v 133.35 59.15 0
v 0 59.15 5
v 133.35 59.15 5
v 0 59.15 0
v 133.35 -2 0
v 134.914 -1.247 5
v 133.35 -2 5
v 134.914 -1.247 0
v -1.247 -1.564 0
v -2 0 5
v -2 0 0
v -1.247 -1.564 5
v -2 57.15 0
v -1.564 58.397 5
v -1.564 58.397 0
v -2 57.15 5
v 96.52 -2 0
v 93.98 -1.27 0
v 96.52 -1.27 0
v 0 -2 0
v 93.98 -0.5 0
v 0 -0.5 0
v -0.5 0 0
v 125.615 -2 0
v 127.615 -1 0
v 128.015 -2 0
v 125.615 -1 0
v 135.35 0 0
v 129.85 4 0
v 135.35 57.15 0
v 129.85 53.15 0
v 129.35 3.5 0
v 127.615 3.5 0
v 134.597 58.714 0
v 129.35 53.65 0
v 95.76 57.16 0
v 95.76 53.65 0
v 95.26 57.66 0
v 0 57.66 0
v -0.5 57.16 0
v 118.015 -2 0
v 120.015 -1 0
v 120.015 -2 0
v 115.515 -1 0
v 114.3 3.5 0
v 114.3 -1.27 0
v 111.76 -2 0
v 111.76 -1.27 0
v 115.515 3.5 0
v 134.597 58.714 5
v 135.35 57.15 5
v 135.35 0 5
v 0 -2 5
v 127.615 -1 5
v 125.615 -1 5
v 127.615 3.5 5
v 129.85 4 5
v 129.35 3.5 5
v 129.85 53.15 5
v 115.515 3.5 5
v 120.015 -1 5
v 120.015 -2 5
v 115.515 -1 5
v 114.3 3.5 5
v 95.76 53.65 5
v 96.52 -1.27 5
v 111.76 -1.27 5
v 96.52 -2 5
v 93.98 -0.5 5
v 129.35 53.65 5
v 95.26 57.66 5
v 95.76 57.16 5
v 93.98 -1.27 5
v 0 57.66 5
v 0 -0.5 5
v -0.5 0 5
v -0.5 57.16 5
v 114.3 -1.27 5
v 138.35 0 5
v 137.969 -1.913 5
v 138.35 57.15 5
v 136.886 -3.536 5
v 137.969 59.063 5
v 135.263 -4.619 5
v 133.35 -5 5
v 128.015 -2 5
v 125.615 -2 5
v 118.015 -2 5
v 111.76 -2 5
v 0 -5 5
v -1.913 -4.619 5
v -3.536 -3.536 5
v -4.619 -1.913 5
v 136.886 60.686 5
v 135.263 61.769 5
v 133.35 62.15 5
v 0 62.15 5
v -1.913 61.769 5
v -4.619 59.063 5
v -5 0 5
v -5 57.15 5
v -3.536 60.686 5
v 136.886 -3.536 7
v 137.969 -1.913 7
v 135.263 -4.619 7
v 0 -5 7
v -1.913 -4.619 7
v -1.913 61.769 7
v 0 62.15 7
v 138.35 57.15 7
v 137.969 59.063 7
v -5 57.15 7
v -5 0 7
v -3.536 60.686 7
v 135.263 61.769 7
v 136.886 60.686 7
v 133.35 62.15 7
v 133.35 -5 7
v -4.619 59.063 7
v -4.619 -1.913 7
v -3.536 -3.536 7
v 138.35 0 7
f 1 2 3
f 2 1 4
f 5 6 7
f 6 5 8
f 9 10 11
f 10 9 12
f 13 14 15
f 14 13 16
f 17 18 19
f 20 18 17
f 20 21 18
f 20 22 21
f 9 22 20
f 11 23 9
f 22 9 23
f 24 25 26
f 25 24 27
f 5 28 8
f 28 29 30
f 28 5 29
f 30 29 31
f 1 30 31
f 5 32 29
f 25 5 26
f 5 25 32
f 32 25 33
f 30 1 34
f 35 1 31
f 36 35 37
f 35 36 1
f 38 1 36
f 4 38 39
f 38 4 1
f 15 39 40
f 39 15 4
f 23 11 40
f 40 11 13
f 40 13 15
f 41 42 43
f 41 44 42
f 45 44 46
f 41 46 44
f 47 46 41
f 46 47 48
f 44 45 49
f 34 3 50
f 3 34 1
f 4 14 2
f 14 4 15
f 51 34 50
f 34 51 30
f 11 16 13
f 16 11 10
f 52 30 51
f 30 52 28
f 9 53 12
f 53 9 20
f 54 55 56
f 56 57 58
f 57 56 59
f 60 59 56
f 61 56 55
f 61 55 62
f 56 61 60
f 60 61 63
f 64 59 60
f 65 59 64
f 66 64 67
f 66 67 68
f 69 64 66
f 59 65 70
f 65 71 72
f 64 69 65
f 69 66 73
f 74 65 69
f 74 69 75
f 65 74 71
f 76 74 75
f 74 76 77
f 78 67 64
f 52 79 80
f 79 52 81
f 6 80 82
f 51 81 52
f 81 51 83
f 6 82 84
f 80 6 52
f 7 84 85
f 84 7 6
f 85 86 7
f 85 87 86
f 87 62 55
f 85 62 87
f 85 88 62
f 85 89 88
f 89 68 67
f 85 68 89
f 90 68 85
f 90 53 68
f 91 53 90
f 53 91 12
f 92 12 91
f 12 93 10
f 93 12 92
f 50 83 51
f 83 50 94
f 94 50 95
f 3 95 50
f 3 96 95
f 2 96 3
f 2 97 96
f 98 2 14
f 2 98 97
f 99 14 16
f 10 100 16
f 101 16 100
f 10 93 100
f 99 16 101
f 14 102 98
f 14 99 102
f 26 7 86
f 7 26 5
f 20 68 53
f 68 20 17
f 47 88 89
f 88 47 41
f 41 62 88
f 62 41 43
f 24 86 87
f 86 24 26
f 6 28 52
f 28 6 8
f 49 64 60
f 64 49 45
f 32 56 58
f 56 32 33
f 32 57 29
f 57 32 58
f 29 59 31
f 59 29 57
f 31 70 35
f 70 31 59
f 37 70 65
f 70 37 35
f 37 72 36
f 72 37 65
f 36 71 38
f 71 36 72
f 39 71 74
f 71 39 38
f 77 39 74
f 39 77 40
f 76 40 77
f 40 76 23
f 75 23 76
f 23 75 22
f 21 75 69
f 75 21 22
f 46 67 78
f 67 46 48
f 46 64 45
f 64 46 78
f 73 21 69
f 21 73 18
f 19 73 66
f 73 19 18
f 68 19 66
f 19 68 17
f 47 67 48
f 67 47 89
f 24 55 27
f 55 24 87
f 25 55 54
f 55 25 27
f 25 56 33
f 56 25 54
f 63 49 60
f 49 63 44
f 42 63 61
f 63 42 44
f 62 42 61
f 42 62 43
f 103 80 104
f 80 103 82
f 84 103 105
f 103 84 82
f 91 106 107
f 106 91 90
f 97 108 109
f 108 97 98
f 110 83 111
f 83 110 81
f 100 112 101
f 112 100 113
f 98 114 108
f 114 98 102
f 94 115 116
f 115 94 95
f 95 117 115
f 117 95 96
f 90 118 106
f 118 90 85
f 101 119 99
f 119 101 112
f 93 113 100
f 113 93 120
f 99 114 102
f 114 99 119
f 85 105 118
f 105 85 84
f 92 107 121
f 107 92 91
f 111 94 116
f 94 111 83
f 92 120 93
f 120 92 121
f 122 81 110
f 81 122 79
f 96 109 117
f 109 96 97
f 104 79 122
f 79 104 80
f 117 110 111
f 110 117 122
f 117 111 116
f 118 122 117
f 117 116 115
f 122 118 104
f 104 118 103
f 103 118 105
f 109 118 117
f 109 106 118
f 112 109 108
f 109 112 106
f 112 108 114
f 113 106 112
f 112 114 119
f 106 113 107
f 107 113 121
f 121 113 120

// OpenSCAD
// file: ../../../lib/circuits/helpers.scad
function bu(u) = u * 2.54;

module breadboard_row(number, orientation="vertical") {
  children();
  if(number > 1) {
    if(orientation == "vertical") {
      translate([0,bu(1),0])
        breadboard_row(number-1, orientation=orientation) {
          children();
        }
    } else {
      translate([bu(1),0,0])
        breadboard_row(number-1, orientation=orientation){
          children();
        }
    }
  }
}
// file: ../../../lib/switches/rgb.scad
include <../variables.scad>

module rgb_row_trace_connection(width, height, xpos, ypos, rgb, connections) {
  half_width = u_mm(width)/2;
  half_height = u_mm(height)/2;
  if(connections[3] == "connect") {
    translate([1-half_width,8.875,0]){
      circle(d=0.8,$fn=40);
      offset(0.4)
        polygon(points=[[0,-0.01],[0,0.01],[u_mm(-xpos)-2, u_mm(-ypos)+0.01],[u_mm(-xpos)-2, u_mm(-ypos)-0.01]]);
    }
    translate([1-half_width,4.9,0]){
      circle(d=0.8,$fn=40);
      offset(0.4)
        polygon(points=[[0,-0.01],[0,0.01],[u_mm(-xpos)-2, u_mm(-ypos)+0.01],[u_mm(-xpos)-2, u_mm(-ypos)-0.01]]);
    }
    translate([1-half_width,3.3,0]){
      circle(d=0.8,$fn=40);
      offset(0.4)
        polygon(points=[[0,-0.01],[0,0.01],[u_mm(-xpos)-2, u_mm(-ypos)+0.01],[u_mm(-xpos)-2, u_mm(-ypos)-0.01]]);
    }
  }
  if(connections[2] == "connect") {
    translate([half_width-1,8.875,0]) {
      circle(d=0.8,$fn=40);
    }
    translate([half_width-1,4.9,0]) {
      circle(d=0.8,$fn=40);
    }
    translate([half_width-1,3.3,0]){
      circle(d=0.8,$fn=40);
    }
  }
}

module rgb_pcb_drill(width=1, height=1, rgb=true, connections=["hole","hole","hole","hole"]) {
  half_width = u_mm(width)/2;
  half_height = u_mm(height)/2;
  translate([half_width,half_height,0]) {
    if(rgb == true) {
      // LED Hole
      translate([-1.875,3.4])
        square([3.75,3]);

      // LED D
      if(connections[3] == "hole")
        translate([1.3-half_width,8,0])
          circle(d=1,$fn=40);
      if(connections[2] == "hole")
        translate([half_width-1.3,8,0])
          circle(d=1,$fn=40);

      // LED G
      if(connections[3] == "hole")
        translate([1.3-half_width,5.4,0])
          circle(d=1,$fn=40);
      if(connections[2] == "hole")
        translate([half_width-1.3,5.4,0])
          circle(d=1,$fn=40);

      // LED V
      if(connections[3] == "hole")
        translate([1.3-half_width,2.8,0])
          circle(d=1,$fn=40);
      if(connections[2] == "hole")
        translate([half_width-1.3,2.8,0])
          circle(d=1,$fn=40);
    }

    children();
  }
}

module rgb_pcb_hole_traces(width=1, height=1, rgb=true, xpos=0, ypos=0, connections=["hole","hole","hole","hole"]) {
  half_width = u_mm(width)/2;
  half_height = u_mm(height)/2;
  translate([half_width,half_height,0]) {
    if(rgb == true) {
      // LED D
      if(connections[3] == "hole")
        translate([1.3-half_width,8,0])
          circle(d=2.5,$fn=40);
      if(connections[2] == "hole")
        translate([half_width-1.3,8,0])
          circle(d=2.5,$fn=40);

      // LED G
      if(connections[3] == "hole")
        translate([1.3-half_width,5.4,0])
          circle(d=2.5,$fn=40);
      if(connections[2] == "hole")
        translate([half_width-1.3,5.4,0])
          circle(d=2.5,$fn=40);

      // LED V
      if(connections[3] == "hole")
        translate([1.3-half_width,2.8,0])
          circle(d=2.5,$fn=40);
      if(connections[2] == "hole")
        translate([half_width-1.3,2.8,0])
          circle(d=2.5,$fn=40);
    }

    children();
  }
}

module rgb_pcb_traces(width=1, height=1, rgb=true, xpos=0, ypos=0, connections=["hole","hole","hole","hole"]) {
  half_width = u_mm(width)/2;
  half_height = u_mm(height)/2;
  rgb_pcb_hole_traces(width=width, height=height, rgb=rgb, connections=connections) {
    if(rgb == true) {
      rgb_row_trace_connection(width=width, height=height, xpos=xpos, ypos=ypos, rgb=rgb, connections=connections);
      v_left = connections[3] == "none" ? 1 : half_width-5;
      // LED G
      translate([1.25,5])
        square([2,2]);
      translate([2.7,8.5,0]) {
        length = connections[2] == "none" ? 2 : half_width-3.7; 
        square([length,0.75]);
      }
      translate([2.7,6.8])
        square([0.8,2.4]);
      translate([-3.5,6.2])
        square([7,0.8]);
      translate([-3.5,6.8])
        square([0.8,2.4]);
      translate([-4-v_left,8.5,0])
        square([v_left+1,0.75]);

      // LED D
      translate([-4-v_left,4.5,0])
        square([v_left,0.8]);
      translate([-4.5,4.5,0])
        square([0.8,1.3]);
      translate([-4.5,5,0])
        square([1.3,0.8]);
      translate([2,4,0])
        square([2,0.8]);
      translate([4,4,0])
        square([0.8,1.3]);
      translate([4,4.5,0]) {
        length = connections[2] == "none" ? 0 : half_width-5; 
        square([length,0.75]);
      }
      translate([-3.375,5])
        square([2,1.1]);
      translate([1.25,3.75])
        square([2,1.1]);

      // LED V
      v_right = connections[2] == "none" ? 0 : half_width-5.25;
      translate([-4-v_left,2.9,0])
        square([v_right+v_left+8.875,0.8]);
      translate([-3.375,3.5])
        square([2,1.35]);
    }

    children();
  }
}
// file: ../../../lib/switches/base.scad
include <../variables.scad>
include <rgb.scad>

// ["top", "bottom", "left", "right"]

module switch_row_trace_connection(width, height, xpos, ypos, rgb, connections) {
  half_width = u_mm(width)/2;
  half_height = u_mm(height)/2;
  if(connections[3] == "connect") {
    translate([1-half_width,-5.5,0]){
      circle(d=0.8,$fn=40);
      offset(0.4)
        polygon(points=[[0,-0.01],[0,0.01],[u_mm(-xpos)-2, u_mm(-ypos)+0.01],[u_mm(-xpos)-2, u_mm(-ypos)-0.01]]);
    }
  }
  if(connections[2] == "connect") {
    translate([half_width-1,-5.5,0]) {
      circle(d=0.8,$fn=40);
    }
  }
}

module switch_column_trace_connection(width, height, xpos, ypos, rgb, connections, last_xpos=0, last_ypos=0) {
  half_width = u_mm(width)/2;
  half_height = u_mm(height)/2;
  if(connections[1] == "connect") {
    translate([-u_mm((width-1)/2)-0.9,half_height-1,0]) {
      circle(d=0.8,$fn=40);
      offset(0.4)
        polygon(points=[[0,-0.01],[0,0.01],[u_mm((width-1)/2),0.01],[u_mm((width-1)/2),-0.01]]);
    }
  }
  if(connections[0] == "connect") {
    y_off = u_mm(ypos-last_ypos);
    x_off = u_mm(last_xpos-xpos);
    translate([-0.875,-1-y_off-half_height,0]) {
      offset(0.4)
        polygon(points=[[-0.01+x_off,0],[0.01+x_off,0],[0.01,2+y_off],[-0.01,2+y_off]]);
      translate([x_off-0.01,0]) {
        offset(0.4)
          polygon(points=[[0,-0.01],[0,0.01],[u_mm((width-1)/2)+1,0.01],[u_mm((width-1)/2)+1,-0.01]]);
      }
    }
  }
}

module switch_base_pcb_drill(width=1, height=1, rgb=true, single=true, connections=["hole","hole","hole","hole"]) {
  half_width = u_mm(width)/2;
  half_height = u_mm(height)/2;
  rgb_pcb_drill(width=width, height=height, rgb=rgb, connections=connections) {
    // Row
    if(connections[2] == "hole")
      translate([half_width-1.3,-5.5,0])
        circle(d=1,$fn=40);
    if(connections[3] == "hole")
      translate([1.3-half_width,-5.5,0])
        circle(d=1,$fn=40);

    // Column
    if(connections[1] == "hole")
      translate([-1,half_height-1.25,0])
        circle(d=1,$fn=40);
    if(connections[0] == "hole")
      translate([-1,1.25-half_height,0])
        circle(d=1,$fn=40);

    children();
  }
}

module switch_base_pcb_traces(width=1, height=1, rgb=true, xpos=0, ypos=0, connections=["hole","hole","hole","hole"], last_xpos=0, last_ypos=0, single=true) {
  half_width = u_mm(width)/2;
  half_height = u_mm(height)/2;
  rgb_pcb_traces(width=width, height=height, rgb=rgb, xpos=xpos, ypos=ypos, connections=connections) {
    switch_row_trace_connection(width, height, xpos, ypos, rgb, connections);
    if(single && !rgb)
      switch_column_trace_connection(width, height, xpos, ypos, rgb, connections, last_xpos=last_xpos, last_ypos=last_ypos);

    // Row
    if(connections[2] == "hole")
      translate([half_width-1.3,-5.5,0])
        circle(d=2.5,$fn=40);
    if(connections[3] == "hole")
      translate([1.3-half_width,-5.5,0])
        circle(d=2.5,$fn=40);

    // Column
    if(connections[1] == "hole")
      translate([-1,half_height-1.25,0])
        circle(d=2.4,$fn=40);
    if(connections[0] == "hole")
      translate([-1,1.25-half_height,0])
        circle(d=2.4,$fn=40);

    children();
  }
}

module switch_base_pcb_traces_bottom(width=1, height=1, rgb=true, xpos=0, ypos=0, connections=["hole","hole","hole","hole"], last_xpos=0, last_ypos=0) {
  half_width = u_mm(width)/2;
  half_height = u_mm(height)/2;
  rgb_pcb_hole_traces(width=width, height=height, rgb=rgb, connections=connections) {
    switch_column_trace_connection(width, height, xpos, ypos, rgb, connections, last_xpos=last_xpos, last_ypos=last_ypos);

    // Row
    if(connections[2] == "hole")
      translate([half_width-1.3,-5.5,0])
        circle(d=2.5,$fn=40);
    if(connections[3] == "hole")
      translate([1.3-half_width,-5.5,0])
        circle(d=2.5,$fn=40);

    // Column
    if(connections[1] == "hole")
      translate([-1,half_height-1.25,0])
        circle(d=2.5,$fn=40);
    if(connections[0] == "hole")
      translate([-1,1.25-half_height,0])
        circle(d=2.5,$fn=40);

    children();
  }
}
// file: ../../../lib/switches/footprints.scad
include <../variables.scad>
include <stabilizers.scad>

module pcb_switch_outline(width=1, height=1) {
  stab_extra = width >= 2 ? 2 : 0;
  translate([0,-stab_extra])
    square([u_mm(width)+0.01, u_mm(height)+0.01+stab_extra]);
}

module pcb_switch_space_outline(width=1, height=1, style="mx", cnc=false) {
  offset = height_for_style(style);
  stab_extra = width >= 2 ? 2 : 0;
  translate([-1,-1-stab_extra,2.834-offset])
    cube([u_mm(width) + 2, u_mm(height) + 2 + stab_extra, 1.166+offset]);
  translate([u_mm(width/2),u_mm(height/2)]) {
    translate([-7.5,-7.5,1.5-offset])
      cube([15,15,5]);
    translate([-7,-7,-10])
      cube([14,14,10]);
    translate([u_mm(-width/2)-0.5,u_mm(-height/2)-0.5,-20-offset])
      cube([u_mm(width)+1,u_mm(height)+1, 20]);
  }
  translate([hole_offset(width), hole_offset(height),-10])
    stab(width);
}
// file: ../../../lib/switches/stabilizers.scad
module stab_hole_render(distance){
  translate([14+distance+3.375,6.99,0]) {
    circle(d=3.175, $fn=40);
    translate([0,-15.24,0])
      circle(d=4.064, $fn=40);
  }
  translate([-6.75-distance+3.375,6.99,0]) {
    circle(d=3.175, $fn=40);
    translate([0,-15.24,0])
      circle(d=4.064, $fn=40);
  }
}

module stab_holes(width) {
  if (width >= 7) {
    stab_hole_render(39.6);
  } else if (width >= 6) {
    stab_hole_render(39.6);
  } else if(width >= 2) {
    stab_hole_render(1.6);
  }
}

module stab_render(distance, cnc=false, height=5.334) {
  translate([14+distance,1.47,0]){
    // Right Side Large Hole
    cube([6.75,12.3,10]);

    // Add 1/16" corner holes for milling
    if(cnc){
      translate([0.56,0.56,0])
        cylinder(h=10,d=1.59,$fn=20);
      translate([6.75-0.56,0.56,0])
        cylinder(h=10,d=1.59,$fn=20);
      translate([0.56,12.3-0.56,0])
        cylinder(h=10,d=1.59,$fn=20);
      translate([6.75-0.56,12.3-0.56,0])
        cylinder(h=10,d=1.59,$fn=20);
    }
    translate([5.75,3.23,0]){
      // Side hole for notch
      cube([1.825,3.175,10]);
      translate([1.825,1.59,0])
        if(cnc)
          resize([1.59,3.175,10])
            cylinder(h=10,d=1.59,$fn=20);
    }
    translate([1.725,11.3,0]){
      // Top Notch
      cube([3.3,2.2,10]);
      if(cnc)
        translate([1.65,2.2,0])
          resize([3.3,1,10])
            cylinder(h=10,d=1,$fn=20);
    }
    // Thin out for clip
    translate([-1,-1,10-height+1.5])
      cube([8.75,14.3,height-1.5]);
  }
  translate([-6.75-distance,1.47,0]){
    // Left Side Large Hole
    cube([6.75,12.3,10]);
    translate([-0.825,3.23,0]){
      // Side hole for notch
      cube([1.825,3.175,10]);
      if(cnc)
        translate([0,1.59,0])
          resize([1.59,3.175,10])
            cylinder(h=10,d=1.59,$fn=20);

    }
    translate([1.725,11.3,0]){
      // Top Notch
      cube([3.3,2.2,10]);
      if(cnc)
        translate([1.65,2.2,0])
          resize([3.3,1,10])
            cylinder(h=10,d=1,$fn=20);
    }
    if(cnc){
      translate([0.56,0.56,0])
        cylinder(h=10,d=1.59,$fn=20);
      translate([6.75-0.56,0.56,0])
        cylinder(h=10,d=1.59,$fn=20);
      translate([0.56,12.3-0.56,0])
        cylinder(h=10,d=1.59,$fn=20);
      translate([6.75-0.56,12.3-0.56,0])
        cylinder(h=10,d=1.59,$fn=20);
    }
    // Thin out for clip
    translate([-1,-1,10-height+1.5])
      cube([8.75,14.3,height-1.5]);
  }
  // Center shaft for bar
  translate([-distance-2,4.7,0]){
    cube([distance*2+20,4.6,10]);
  }
}

module stab(key_width, cnc=false) {
  if (key_width >= 7) {
    stab_render(39.6, cnc=cnc);
  } else if (key_width >= 6) {
    stab_render(39.6, cnc=cnc);
  } else if(key_width >= 2) {
    stab_render(1.6, cnc=cnc);
  }
}
// file: ../../../lib/circuits/wire.scad
module guage(guage=12) {
  fn=20;
  if(guage == 8) {
    circle(d=3.25, $fn=fn);
  } else if (guage == 10) {
    circle(d=2.59, $fn=fn);
  } else if (guage == 12) {
    circle(d=2.06, $fn=fn);
  } else if (guage == 14) {
    circle(d=1.57, $fn=fn);
  } else if (guage == 16) {
    circle(d=1.3, $fn=fn);
  }
}

module wire_pcb_drill(guage=12) {
  offset(0.1)
    guage(guage);
}

module wire_pcb_traces(guage=12) {
  offset(0.75)
    guage(guage);
}

module wire_pcb_outline(guage=12) {
  offset(1.5)
    guage(guage);
}

module wire_space_outline(guage=12) {
  linear_extrude(10)
    offset(0.1)
      guage(guage);
}
// file: ../../../lib/circuits/trrs.scad
module trrs_post(d=1.2) {
  translate([0,-d/4,0]) {
    circle(d=d, $fn=20);
    translate([-d/2,0,0]) {
      square([d,(d/2-.2)]);
    }
    translate([0,(d/2-.2),0]) {
      circle(d=d, $fn=20);
    }
  }
}

module trrs_pcb_drill(side="left") {
  translate([2.8,1.5]) {
    circle(d=2, $fn=20);
  }
  translate([2.8,8.5]) {
    circle(d=2, $fn=20);
  }
  translate([0.5,11.3,0]) {
    trrs_post();
  }
  translate([5.1,3.2,0]) {
    trrs_post();
  }
  translate([5.1,6.2,0]) {
    trrs_post();
  }
  translate([5.1,10.2,0]) {
    trrs_post();
  }
  if(side != "none"){
    offset = side == "left" ? 7.6 : -2;
    translate([offset,11.3]) {
      circle(d=1.2, $fn=20);
    }
    translate([offset,8.3]) {
      circle(d=1.2, $fn=20);
    }
    translate([offset,5.3]) {
      circle(d=1.2, $fn=20);
    }
    translate([offset,2.2]) {
      circle(d=1.2, $fn=20);
    }
  }
}

module trrs_pcb_traces(side="left") {
  translate([-1,9.7,0]){
    difference() {
      square([3,3]);
      if(side == "right") {
        translate([3,-1.8]) {
          rotate(45) {
            square(2);
          }
        }
      }
    }
  }
  translate([3.6,1.2,0]){
    difference() {
      square([3,3.5]);
      if(side == "left") {
        translate([3,2.3]) {
          rotate(45) {
            square(2);
          }
        }
      }
    }
  }
  translate([3.6,4.8,0]){
    difference() {
        square([3,3.5]);
        if(side == "left") {
          translate([3,2.3]) {
            rotate(45) {
              square(2);
            }
          }
        }
    }
  }
  translate([3.6,8.4,0]){
    difference() {
      square([3,3.2]);
      if(side == "left") {
        translate([3,1.8]) {
          rotate(45) {
            square(2);
          }
        }
      }
    }
  }
  if(side != "none"){
    translate([side == "left" ? 7.6 : -2,0,0]){
      translate([0,11.3]) {
        circle(d=3, $fn=20);
      }
      translate([0,8.3]) {
        circle(d=2.9, $fn=20);
      }
      translate([0,5.3]) {
        circle(d=3, $fn=20);
      }
      translate([0,2.2]) {
        circle(d=3, $fn=20);
      }
    }
    translate([side == "left" ? 5.6 : -2,0,0]){
      left_trace = side == "left" ? 2.5 : 7.6;
      translate([0,2.2]) {
        square([left_trace,1.5]);
      }
      translate([0,5.1]) {
        square([left_trace,1.5]);
      }
      if(side == "left") {
        translate([0,8.7]) {
          square([left_trace,0.9]);
        }
      }
      else {
        translate([0,8]) {
          square([4,1.6]);
        }
        translate([4,9]) {
          square([4,1.6]);
        }
        translate([2.8,9.4]) {
          rotate(-45) {
            square([1,1.7]);
          }
        }
      }
    }
    translate([side == "left" ? 0.5 : -2,0,0]){
      right_trace = side == "left" ? 7.1 : 2;
      translate([0,11.7]) {
        square([right_trace,1.3]);
      }
      translate([0,12]) {
        circle(1, $fn=20);
      }
      translate([right_trace,11.8]) {
        circle(1, $fn=20);
      }
    }
  }
}

module trrs_pcb_outline(side="left") {
  translate([-1,0,0]) {
    square([7.6,13.1]);
  }
  if(side != "none"){
    translate([side == "left" ? 5.6 : -3.5, 0]) {
      square([4,13.1]);
    }
  }
}

module trrs_space_outline(side="left") {
  translate([0,0,-5.3]) {
    linear_extrude(7){
      translate([-2,-1,0])
        square([9.6,15.1]);
      translate([0,-12.1,0])
        square([5.6,12.1]);
      if(side != "none")
        translate([side == "left" ? 5.6 : -4.5, -1])
          square([5,15.1]);
    }
  }
  translate([3,-2,-2.6]) {
    rotate([90,0,0]) {
      cylinder(d=10, h=30, $fn=100);
    }
  }
}
// file: ../../../lib/circuits/trace.scad
function vdef(vector, index) = len(vector) == index ? vector[index-1] : vector[index];
function vadd(vector, index, axis) = vdef(vector, index)[axis] > vdef(vector, index-1)[axis] ? 0.01 : -0.01;
function polygon_from_vector(vector) = 
  len(vector) > 0 ?
    concat(vector, 
      [for (i = [1:len(vector)]) 
        [vector[len(vector)-i][0]-vadd(vector, i, 0),vector[len(vector)-i][1]-vadd(vector, i, 1)]])
      : [];

function parse_loc(loc) = [
  loc[5],
  len(loc) < 7 ? "both" : loc[6],
  len(loc) < 8 ? "none" : loc[7],
];

module manual_trace_pcb_drill(location) {
  vector = parse_loc(location)[0];
  echo("holes", parse_loc(location)[2]);
  if(parse_loc(location)[2] == "holes" || parse_loc(location)[2] == "hole_begin") {
    translate(vector[0]) {
      circle(d=1, $fn=20);
    }
  }
  if(parse_loc(location)[2] == "holes" || parse_loc(location)[2] == "hole_end") {
    translate(vector[len(vector)-1]) {
      circle(d=1, $fn=20);
    }
  }
}

module manual_trace_pcb_traces(location) {
  vector = parse_loc(location)[0];
  if(parse_loc(location)[1] != "bottom") {
    offset(0.4) {
      polygon(points=polygon_from_vector(vector));
    }
  }
  if(parse_loc(location)[2] == "holes" || parse_loc(location)[2] == "hole_begin") {
    translate(vector[0]) {
      circle(d=2.5, $fn=20);
    }
  }
  if(parse_loc(location)[2] == "holes" || parse_loc(location)[2] == "hole_end") {
    translate(vector[len(vector)-1]) {
      circle(d=2.5, $fn=20);
    }
  }
}

module manual_trace_pcb_traces_bottom(location) {
  vector = parse_loc(location)[0];
  if(parse_loc(location)[1] != "top") {
    offset(0.4) {
      polygon(points=polygon_from_vector(vector));
    }
  }
  if(parse_loc(location)[2] == "holes" || parse_loc(location)[2] == "hole_begin") {
    translate(vector[0]) {
      circle(d=2.5, $fn=20);
    }
  }
  if(parse_loc(location)[2] == "holes" || parse_loc(location)[2] == "hole_end") {
    translate(vector[len(vector)-1]) {
      circle(d=2.5, $fn=20);
    }
  }
}

module manual_trace_pcb_outline(location) {
  vector = parse_loc(location)[0];
  echo("location", location);
  offset(1)
    polygon(points=polygon_from_vector(vector));

  if(parse_loc(location)[2] == "holes" || parse_loc(location)[2] == "hole_begin") {
    translate(vector[0]) {
      circle(d=4, $fn=20);
    }
  }
  if(parse_loc(location)[2] == "holes" || parse_loc(location)[2] == "hole_end") {
    translate(vector[len(vector)-1]) {
      circle(d=4, $fn=20);
    }
  }
}

module manual_trace_space_outline(location) {
  vector = parse_loc(location)[0];
  translate([0,0,-1])
    linear_extrude(2)
      offset(0.5)
        manual_trace_pcb_outline(vector);
}
// file: ../../../lib/circuits/support.scad
module support_pcb_drill(mm=2) {
  offset(0.1)
    circle(d=mm, $fn=20);
}

module support_pcb_traces(mm=2) {
}

module support_pcb_outline(mm=2) {
  offset(2)
    circle(d=mm, $fn=20);
}

module support_space_outline(mm=2) {
  linear_extrude(10)
    offset(0.1)
      circle(d=mm, $fn=20);
}
// file: ../../../lib/circuits/proton_c.scad
use <helpers.scad>

module proton_c_pcb_drill(size="full") {
  translate([bu(0.5),bu(1.5),0]) {
    translate([0,bu(1)])
      breadboard_row(4, "horizontal"){
        circle(d=1, $fn=20);
        translate([0,bu(1)])
          circle(d=1, $fn=20);
      }
    translate([bu(4),bu(1)])
      breadboard_row(2)
        circle(d=1, $fn=20);
    translate([bu(4),bu(3)])
      breadboard_row(2)
        circle(d=1, $fn=20);
    circle(d=1, $fn=20);
    translate([bu(1),0,0])
      circle(d=1, $fn=20);
    translate([bu(5),0,0])
      circle(d=1, $fn=20);
    translate([bu(6),0,0])
      circle(d=1, $fn=20);
    breadboard_row(12) {
      circle(d=1, $fn=20);
      translate([bu(1),0,0])
        circle(d=1, $fn=20);
      translate([bu(5),0,0])
        circle(d=1, $fn=20);
      translate([bu(6),0,0])
        circle(d=1, $fn=20);
    }
    if(size == "full")
      translate([0,bu(13)])
        breadboard_row(6) {
          circle(d=1, $fn=20);
          translate([bu(1),0,0])
            circle(d=1, $fn=20);
          translate([bu(5),0,0])
            circle(d=1, $fn=20);
          translate([bu(6),0,0])
            circle(d=1, $fn=20);
    }
  }
}

module proton_c_pcb_traces(size="full") {
  translate([bu(0.5),bu(1.5),0]) {
    translate([0,bu(1)])
      breadboard_row(4, "horizontal"){
        circle(d=2.4, $fn=20);
        translate([-1,0])
          square([2,bu(1)]);
        translate([0,bu(1)])
          circle(d=2.4, $fn=20);
      }
    translate([0,bu(1)])
      breadboard_row(2) {
        translate([bu(5),0])
          circle(d=2.4, $fn=20);
        translate([bu(5),-1,0])
          square([bu(1),2]);
        translate([bu(6),0,0])
          circle(d=2.4, $fn=20);
      }
    translate([bu(4),bu(1)]){
      translate([-0.75,-1])
        square([1.5,bu(2)-2]);
      breadboard_row(2)
        circle(d=2.4, $fn=20);
      translate([0,-0.75])
        square([bu(2),1.5]);
    }
    translate([bu(4),bu(3)]){
      translate([-0.75,-1])
        square([1.5,bu(2)-2]);
      breadboard_row(2)
        circle(d=2.4, $fn=20);
      translate([0,-0.75])
        square([bu(2),1.5]);
    }
    circle(d=2.4, $fn=20);
    translate([0,-1,0])
      square([bu(1),2]);
    translate([bu(1),0,0])
      circle(d=2.4, $fn=20);
    translate([bu(5),0])
      circle(d=2.4, $fn=20);
    translate([bu(5),-1,0])
      square([bu(1),2]);
    translate([bu(6),0,0])
      circle(d=2.4, $fn=20);
    translate([0,bu(3)])
      breadboard_row(9) {
        circle(d=2.4, $fn=20);
        translate([0,-1,0])
          square([bu(1),2]);
        translate([bu(1),0,0])
          circle(d=2.4, $fn=20);
        translate([bu(5),0])
          circle(d=2.4, $fn=20);
        translate([bu(5),-1,0])
          square([bu(1),2]);
        translate([bu(6),0,0])
          circle(d=2.4, $fn=20);
      }
    if(size == "full")
      translate([0,bu(13)])
        breadboard_row(6) {
          circle(d=2.4, $fn=20);
          translate([0,-1,0])
            square([bu(1),2]);
          translate([bu(1),0,0])
            circle(d=2.4, $fn=20);
          translate([bu(5),0])
            circle(d=2.4, $fn=20);
          translate([bu(5),-1,0])
            square([bu(1),2]);
          translate([bu(6),0,0])
            circle(d=2.4, $fn=20);
        }
  }
}

module proton_c_pcb_outline(size="full") {
  translate([0,bu(1)])
  square([bu(7), bu(size == "full" ? 19 : 12)]);
}

module proton_c_space_outline(size="full") {
  translate([0,0,-4]) {
    linear_extrude(6) {
      translate([-bu(0.5),-bu(0.5)])
        square([bu(8), bu(size == "full" ? 21 : 14)]);
    }
    linear_extrude(5) {
      translate([bu(0.5),-bu(15),0])
        square([bu(6),bu(25)]);
    }
  }
}
// file: ../../../lib/circuits/pro_micro.scad
use <helpers.scad>

module pro_micro_pcb_drill(connections="holes") {
  translate([bu(0.5),bu(1.5),0]) {
    if(connections == "holes"){
      translate([bu(3),bu(1)])
        breadboard_row(3)
          circle(d=1, $fn=20);
      translate([bu(4),bu(3)])
        breadboard_row(3)
          circle(d=1, $fn=20);
    }
    breadboard_row(12) {
      circle(d=1, $fn=20);
      if(connections == "holes") {
        translate([bu(1),0,0])
          circle(d=1, $fn=20);
        translate([bu(5),0,0])
          circle(d=1, $fn=20);
      }
      translate([bu(6),0,0])
        circle(d=1, $fn=20);
    }
  }
}

module pro_micro_pcb_traces(connections="holes") {
  translate([bu(0.5),bu(1.5),0]) {
    // GRND
    if(connections == "holes"){
      translate([bu(3),bu(1)]){
        translate([-0.75,-1])
          square([1.5,bu(3)-2]);
        breadboard_row(3)
          circle(d=2.4, $fn=20);
        translate([0,-0.75])
          square([bu(2),1.5]);
      }
      translate([bu(4),bu(3)]){
        translate([-0.75,-1])
          square([1.5,bu(3)-2]);
        breadboard_row(3)
          circle(d=2.4, $fn=20);
        translate([0,-0.75])
          square([bu(2),1.5]);
      }
    }
    breadboard_row(12) {
      circle(d=2.4, $fn=20);
      if(connections == "holes") {
        translate([0,-1,0])
          square([bu(1),2]);
        translate([bu(1),0,0])
          circle(d=2.4, $fn=20);
        translate([bu(5),0])  
          circle(d=2.4, $fn=20);
        translate([bu(5),-1,0])
          square([bu(1),2]);
      }
      translate([bu(6),0,0])
        circle(d=2.4, $fn=20);
    }
  }
}

module pro_micro_pcb_outline() {
  translate([0,bu(1)])
  square([bu(7), bu(12)]);
}

module pro_micro_space_outline() {
  translate([0,0,-4]) {
    linear_extrude(6) {
      translate([-bu(0.5),-bu(0.5)])
        square([bu(8), bu(14)]);
    }
    linear_extrude(5) {
      translate([bu(0.5),-bu(15),0])
        square([bu(6),bu(25)]);
    }
  }
}
// file: ../../../lib/circuits/mts_101.scad
use <../variables.scad>
module mts_101_pcb_drill() {
  translate([0,1.25]) {
    translate([2.5,0])
      square([3,1]);
    translate([1.25,0.5])
      circle(d=1,$fn=40);
    translate([6.75,0.5])
      circle(d=1,$fn=40);

    translate([2.5,4.75])
      square([3,1]);
    translate([1.25,5.25])
      circle(d=1,$fn=40);
    translate([6.75,5.25])
      circle(d=1,$fn=40);

    translate([4,10])
      circle(d=1,$fn=40);
    translate([1.25,10])
      circle(d=1,$fn=40);
    translate([6.75,10])
      circle(d=1,$fn=40);
  }
}

module mts_101_pcb_traces() {
  translate([0,1.25]) {
    translate([2,-0.5])
      square([4,2]);
    translate([1.25,0.5])
      circle(d=2,$fn=40);
    translate([6.75,0.5])
      circle(d=2,$fn=40);

    translate([2,4.25])
      square([4,2]);
    translate([1.25,5.25])
      circle(d=2,$fn=40);
    translate([6.75,5.25])
      circle(d=2,$fn=40);

    translate([4,10])
      circle(d=2,$fn=40);
    translate([1.25,9.5])
      square([6,1]);
    translate([1.25,10])
      circle(d=2,$fn=40);
    translate([6.75,10])
      circle(d=2,$fn=40);
  }
}

module mts_101_pcb_outline() {
  square([8,13]);
}

module mts_101_space_outline(, cnc=false) {
  translate([-0.5,-0.5,-10])
    cube([9,14, 14.4]);
  translate([4,6.5,-26]) {
    cylinder(d=6, h=18, $fn=30);
    cylinder(d=12, h=10, $fn=60);
  }
}
// file: ../../../lib/circuits/ec11.scad
use <../variables.scad>
use <../switches/base.scad>

module 1u_centered() {
  translate([u_mm(0.5),u_mm(0.5)])
    children();
}

module ec11_pcb_drill(single=false, connections=["hole","hole","hole","hole"]) {
  switch_base_pcb_drill(rgb=false, connections=connections) {
    // Key Column
    translate([-3,0,0])
      circle(d=1,$fn=40);

    // Key Row
    translate([7,2.5])
      circle(d=1, $fn=20);

    if(single) {
      translate([4.25,-3,0])
        circle(d=1, $fn=20);
      translate([-3,-3.25,0])
        circle(d=1,$fn=40);
    }
    translate([4.25,0,0])
      circle(d=1, $fn=20);

    translate([7,-2.5])
      circle(d=1, $fn=20);

    if(connections[3] == "hole"){
      translate([-5.5,2.5])
        circle(d=1, $fn=20);
      translate([-5.5,0])
        circle(d=1, $fn=20);
      translate([-5.5,-2.5])
        circle(d=1, $fn=20);
    }
    translate([-7.5,-2.5])
      circle(d=1, $fn=20);
    translate([-7.5,2.5])
      circle(d=1, $fn=20);
    translate([-7.5,0])
      circle(d=1, $fn=20);

    translate([-1.3,-6.25])
      square([2.6,1.5]);
    translate([-1.3,4.75])
      square([2.6,1.5]);
  }
}

module ec11_pcb_traces(single=false, connections=["hole","hole","hole","hole"]) {
  switch_base_pcb_traces(single=single, rgb=false, connections=connections) {
    // Key Row
    if(single){
      translate([2,2.2])
        square([4.5,0.8]);
      r_len = connections[0] != "none" ? u_mm(0.5)-1 : 6;
      l_len = connections[1] != "none" ? u_mm(0.5)-1 : 6;
      translate([2,-r_len])
        square([0.8,r_len+l_len]);
      if(connections[0] != "none")
        translate([-2,1-u_mm(0.5)])
          square([4,0.8]);
      if(connections[1] != "none")
        translate([-2.1,u_mm(0.5)-1.6])
          square([4.9,0.8]);
    }
    translate([7,2.5])
      circle(d=2.5,$fn=40);

    // Key Column
    if(connections[3] != "none")
      translate([1-u_mm(0.5),-6])
        square([u_mm(0.5)-4,1]);
    translate([-3.25,-6])
      square([0.8,5]);
    translate([-3,0])
      circle(d=2.5,$fn=40);

    if(single){
      translate([-3,-3.25])
        circle(d=2.5,$fn=40);
      translate([4.25,-3])
        circle(d=2.5,$fn=40);
    } else {
      translate([-3,-3.25])
        square([7.8,0.8]);
    }

    translate([7,-2.5])
      circle(d=2.5,$fn=40);
    translate([4.25,0]) {
      circle(d=2.5,$fn=40);
      rotate(-45)
        square([5,0.8]);
    }

    translate([4,-6])
      square([0.8,3]);
    if(connections[2] != "none")
      translate([4,-6])
        square([4.5,0.8]);

    if(connections[3] == "hole"){
      translate([-5.5,2.5])
        circle(d=2.25, $fn=20);
      translate([-5.5,0])
        circle(d=2.25, $fn=20);
      translate([-5.5,-2.5])
        circle(d=2.25, $fn=20);
    }
    translate([-7.5,-2.5])
      circle(d=2.25, $fn=20);
    translate([-7.5,2.5])
      circle(d=2.25, $fn=20);
    translate([-7.5,0])
      circle(d=2.25, $fn=20);
  }
}

module ec11_pcb_traces_bottom(connections=["hole","hole","hole","hole"]) {
  switch_base_pcb_traces_bottom(rgb=false, connections=connections) {
    // Key Row
    translate([2,2.2])
      square([4.5,0.8]);
    r_len = connections[0] != "none" ? u_mm(0.5)-1 : 6;
    l_len = connections[1] != "none" ? u_mm(0.5)-1 : 6;
    translate([2,-r_len])
      square([0.8,r_len+l_len]);
    
    if(connections[0] != "none")
      translate([-1.3,1-u_mm(0.5)])
        square([4,0.8]);
    if(connections[1] != "none")
      translate([-1,u_mm(0.5)-1.4])
        square([3.8,0.8]);
    translate([7,2.5])
      circle(d=2.5,$fn=40);

    // Key Column
    translate([-3,0])
      circle(d=2.5,$fn=40);

    translate([7,-2.5])
      circle(d=2.5,$fn=40);
    translate([4.25,0]) {
      circle(d=2.5,$fn=40);
    }

    if(connections[3] == "hole"){
      translate([-5.5,2.5])
        circle(d=2.25, $fn=20);
      translate([-5.5,0])
        circle(d=2.25, $fn=20);
      translate([-5.5,-2.5])
        circle(d=2.25, $fn=20);
    }
    translate([-7.5,-2.5])
      circle(d=2.25, $fn=20);
    translate([-7.5,2.5])
      circle(d=2.25, $fn=20);
    translate([-7.5,0])
      circle(d=2.25, $fn=20);
  }
}

module ec11_pcb_outline() {
  square([u_mm(1), u_mm(1)]);
}

module ec11_space_outline() {
  translate([-0.5,-0.5, -6])
    cube([u_mm(1)+1, u_mm(1)+1, 8]);
  1u_centered() {
    translate([0,0,-15])
      linear_extrude(15)
        circle(d=7, $fn=30);
    translate([0,0,-25])
      linear_extrude(15)
        circle(d=19, $fn=80);
  }
}
// file: ../../../lib/switches/choc_v1.scad
include <../variables.scad>
include <stabilizers.scad>
include <footprints.scad>

module switch_choc_v1_pcb_drill(width=1, height=1) {
  half_width = u_mm(width)/2;
  half_height = u_mm(height)/2;
  translate([half_width,half_height,0]) {
    circle(d=3.5, $fn=30);

    translate([-5.5,0])
      circle(d=2, $fn=30);
    translate([3,3.8])
      circle(d=1, $fn=30);
    translate([-4, 3.8])
      circle(d=1, $fn=30);
    translate([-4,1.25-half_height])
      circle(d=1, $fn=30);
    translate([-4, half_height-3])
      circle(d=1, $fn=30);

    translate([5.5,0])
      circle(d=2, $fn=30);
    translate([0,5.9])
      circle(d=1.3, $fn=30);
    translate([5,3.8])
      circle(d=1.3, $fn=30);
    translate([1-half_width, half_height-1])
      circle(d=1, $fn=30);
    translate([half_width-1, half_height-1])
      circle(d=1, $fn=30);
  }
}

module switch_choc_v1_pcb_traces(width=1, height=1) {
  half_width = u_mm(width)/2;
  half_height = u_mm(height)/2;
  translate([half_width,half_height,0]) {
    translate([5,3.8])
      circle(d=2.8, $fn=30);
    translate([3,3.8])
      circle(d=2.5, $fn=30);
    translate([-4, 3.8])
      circle(d=2.5, $fn=30);
    translate([-4.5, 2-half_height])
      square([1, u_mm(height)-4]);
    translate([-4,1.25-half_height])
      circle(d=2.5, $fn=30);
    translate([-4, half_height-3])
      circle(d=2.5, $fn=30);

    translate([0,5.9])
      circle(d=2.8, $fn=30);
    translate([-0.5, 5.9])
      square([1, half_height-6.9]);
    translate([1-half_width, half_height-1.5])
      square([half_width*2-2, 1]);
    translate([1-half_width, half_height-1])
      circle(d=2.5, $fn=30);
    translate([half_width-1, half_height-1])
      circle(d=2.5, $fn=30);
  }
}

module switch_choc_v1_pcb_outline(width=1, height=1) {
  pcb_switch_outline(width=width, height=height);
}
// file: ../../../lib/switches/mx.scad
include <../variables.scad>
include <stabilizers.scad>
include <footprints.scad>
include <base.scad>
include <rgb.scad>

module switch_mx_pcb_drill(width=1, height=1, rgb=true, single=true, connections=["hole","hole","hole","hole"]) {
  half_width = u_mm(width)/2;
  half_height = u_mm(height)/2;
  translate([hole_offset(width), half_height]) {
    stab_holes(width);
  }

  switch_base_pcb_drill(width=width, height=height, single=single, rgb=rgb, connections=connections) {
    circle(d=4,$fn=40);
    translate([-3.8,-2.5,0])
      circle(d=1.7,$fn=40);
    translate([2.5,-5,0])
      circle(d=1.7,$fn=40);
    translate([5,0,0])
      circle(d=1.75,$fn=40);
    translate([-5,0,0])
      circle(d=1.75,$fn=40);

    // Column
    translate([-1.2,-3,0])
      circle(d=1,$fn=40);
    translate([5,-2,0])
      circle(d=1,$fn=40);
    if(single){
      translate([6,-3.7,0])
        circle(d=1,$fn=40);
      if(rgb) {
        translate([5,1.7,0])
          circle(d=1,$fn=40);
      } else {
        translate([6,-8.3,0])
          circle(d=1,$fn=40);
      }
    }
  }
}

module switch_mx_pcb_traces(width=1, height=1, rgb=true, single=true, xpos=0, ypos=0, connections=["hole","hole","hole","hole"], last_xpos=0, last_ypos=0) {
  half_width = u_mm(width)/2;
  half_height = u_mm(height)/2;
  switch_base_pcb_traces(width=width, height=height, rgb=rgb, xpos=xpos, ypos=ypos, connections=connections, last_xpos=last_xpos, last_ypos=last_ypos, single=single) {
    translate([-3.8,-2.5,0])
      circle(d=4,$fn=40);
    translate([2.5,-5,0])
      circle(d=4,$fn=40);

    // Row
    v_left = connections[3] == "none" ? 1 : half_width;
    v_right = connections[2] == "none" ? 1 : half_width-5;
    translate([1-v_left,-5.9,0])
      square([v_left+v_right+3,0.8]);

    // Column
    translate([-1.2,-3,0])
      circle(d=2.5,$fn=40);
    translate([5,-2,0])
      circle(d=2.5,$fn=40);
    if(single){
      translate([6,-3.7,0])
        circle(d=2.5,$fn=40);
      difference() {
        translate([5,0,0])
          circle(d=3.55,$fn=40);
        translate([5,-2,0])
          square(4);
      }
      if(rgb) {
        translate([5,1.7,0])
          circle(d=2.3,$fn=40);
      } else {
        translate([4.2,1])
          square([0.8, half_height-2]);
        translate([-1,half_height-1.5])
          square([6,0.8]);
        translate([6,-8.3,0])
          circle(d=2.5,$fn=40);
        translate([-1.3,-8.7,0])
          square([7,0.8]);
      }
    }
  }
}

module switch_mx_pcb_traces_bottom(width=1, height=1, rgb=true, xpos=0, ypos=0, connections=["hole","hole","hole","hole"], last_xpos=0, last_ypos=0) {
  half_width = u_mm(width)/2;
  half_height = u_mm(height)/2;
  switch_base_pcb_traces_bottom(width=width, height=height, rgb=rgb, xpos=xpos, ypos=ypos, connections=connections, last_xpos=last_xpos, last_ypos=last_ypos) {
    translate([-3.8,-2.5,0])
      circle(d=4,$fn=40);
    translate([2.5,-5,0])
      circle(d=4,$fn=40);

    // Column
    translate([-1.2,-3,0])
      circle(d=2.5,$fn=40);
    translate([5,-2,0])
      circle(d=2.5,$fn=40);
    difference(){
      translate([2.5,-5,0])
        circle(d=5.9,$fn=40);
      translate([2.5,-5,0])
        circle(d=4.1,$fn=40);
      translate([0.3,-7,0])
        rotate(45)
          square(6);
    }
    translate([3.85,-3.45])
      square([0.8, 1]);

    t_height = connections[0] == "none" ? 1 : half_height-7.8;
    echo("h", 2-half_height, t_height);
    translate([-1.3,-t_height-6.8])
      square([0.8, t_height]);
    translate([-1.3,-7.2])
      square([2.2,0.8]);
    difference() {
      translate([5,0,0])
        circle(d=3.35,$fn=40);
      translate([5,-2,0])
        square(4);
    }
    b_height = connections[1] == "none" ? 2 : half_height-2;
    translate([4.2,1])
      square([0.8, b_height]);
    if(connections[1] != "none")
      translate([-1,half_height-1.5])
        square([6,0.8]);
  }
}

module switch_mx_pcb_outline(width=1, height=1) {
  pcb_switch_outline(width=width, height=height);
}
// file: ../../../lib/utilities.scad
function reverse(list) = len(list) > 0 ? [for (i = [1:len(list)]) list[len(list)-i]] : [];
function pop(list) = len(list) > 0 ? [for (i = [0:len(list)-1]) if (i != 0) list[i]] : [];
// file: ../../../lib/switches.scad
use <utilities.scad>
include <switches/mx.scad>
include <switches/choc_v1.scad>

module rotate_translate(rotation, xpos, ypos) {
  if(rotation[0] == undef || rotation[0] == 0) {
    translate([u_mm(xpos), u_mm(ypos), 0]) {
      children();
    }
  } else {
    xoff = rotation[1] == undef ? 0 : rotation[1];
    yoff = rotation[2] == undef ? 0 : rotation[2];
    angle = rotation[0] == undef ? 0 : rotation[0];
    translate([u_mm(xpos - xoff), u_mm(ypos - yoff), 0])
      rotate(angle)
        translate([u_mm(xoff), u_mm(yoff), 0])
          children();
  }
}

module switch(type, style="mx", rgb=true, xpos=0, ypos=0, width=1, cnc=false, rotation=[0,0,0], connections=["hole","hole","hole","hole"], last_xpos=0, last_ypos=0) {
  rotate_translate(rotation, xpos, ypos) {
    if(type == "outline")
      pcb_switch_outline(width=width);
    if(style == "mx") {
      if(type == "key")
        pcb_switch_space_outline(width=width, cnc=cnc, style="mx");
      if(type == "traces")
        switch_mx_pcb_traces(width=width, rgb=rgb, xpos=xpos, ypos=ypos, connections=connections, last_xpos=last_xpos, last_ypos=last_ypos);
      if(type == "traces_top")
        switch_mx_pcb_traces(width=width, single=false, rgb=rgb, xpos=xpos, ypos=ypos, connections=connections, last_xpos=last_xpos, last_ypos=last_ypos);
      if(type == "traces_bottom")
        switch_mx_pcb_traces_bottom(width=width, rgb=rgb, xpos=xpos, ypos=ypos, connections=connections, last_xpos=last_xpos, last_ypos=last_ypos);
      if(type == "drill")
        switch_mx_pcb_drill(width=width, rgb=rgb, connections=connections);
      if(type == "drill_double")
        switch_mx_pcb_drill(width=width, single=false, rgb=rgb, connections=connections);
    }

    if(style == "choc_v1") {
      if(type == "key")
        pcb_switch_space_outline(width=width, cnc=cnc, style="choc_v1");
      if(type == "traces")
        switch_choc_v1_pcb_traces(width=width);
      if(type == "traces_top")
        switch_choc_v1_pcb_traces(width=width);
      if(type == "traces_bottom")
        assert(false, "traces_bottom is incompatible with choc_v1");
      if(type == "drill")
        switch_choc_v1_pcb_drill(width=width);
      if(type == "drill_double")
        switch_choc_v1_pcb_drill(width=width, single=false);
    }

    if(style == "redragon") {
      if(type == "key")
        pcb_switch_space_outline(width=width, cnc=cnc, style="redragon");
      if(type == "traces")
        switch_mx_pcb_traces(width=width, rgb=rgb);
      if(type == "traces_top")
        switch_mx_pcb_traces(width=width, single=false, rgb=rgb);
      if(type == "traces_bottom")
        switch_mx_pcb_traces_bottom(width=width, rgb=rgb);
      if(type == "traces")
        switch_mx_pcb_traces(width=width, rgb=rgb);
      if(type == "drill")
        switch_mx_pcb_drill(width=width);
      if(type == "drill_double")
        switch_mx_pcb_drill(width=width, single=false);
    }
  }
}

module switch_row(keys, style="mx", rgb=true, margin=5, thickness=10, depth=0, cnc=false, type="key", last_row=[], last_xpos=0, previous_xpos=0, last_ypos=0, previous_ypos=0) {
  width = keys[0][0] == undef ? 1 : keys[0][0];
  xpos = keys[0][1] == undef ? 0 : keys[0][1];
  ypos = keys[0][2] == undef ? 0 : keys[0][2];
  rotation = keys[0][3] == undef ? [0,0,0] : keys[0][3];
  connections = keys[0][4] == undef ? ["hole","hole","hole","hole"] : keys[0][4];
  last_ypos = last_row[0][2] == undef ? last_ypos - previous_ypos : last_row[0][2]+last_ypos - previous_ypos;
  last_xpos = last_row[0][1] == undef ? last_xpos - previous_xpos : last_row[0][1]+last_xpos - previous_xpos;
  switch(type, style=style, rgb=rgb, xpos=xpos, ypos=ypos, width=width, cnc=cnc, rotation=rotation, connections=connections, last_xpos=last_xpos, last_ypos=last_ypos);
  if(len(keys) > 1) {
    translate([xpos*key_size+width*key_size, ypos*key_size, 0])
      switch_row(pop(keys), style=style, rgb=rgb, margin=margin, thickness=thickness, depth=depth, cnc=cnc, type=type, last_row = pop(last_row), last_xpos=last_xpos, previous_xpos=xpos, last_ypos=last_ypos, previous_ypos=ypos);
  }
}

module switches(switches, style="mx", rgb=true, margin=5, thickness=10, depth=0, cnc=false, type="key", last_row=[]) {
  if(len(switches) != 0) {
    switch_row(switches[0], style=style, rgb=rgb, margin=margin, thickness=thickness, depth=depth, cnc=cnc, type=type, last_row=last_row);
    if(len(switches) > 1) {
      last_row = switches[0];
      translate([0, key_size, 0])
        switches(pop(switches), style=style, rgb=rgb, margin=margin, depth=depth, thickness=thickness, cnc=cnc, type=type, last_row=last_row);
    }
  }
}
// file: ../../../lib/case.scad
include <variables.scad>
use <utilities.scad>
use <circuits.scad>

function key_width(key) = (key[0] == undef ? 1 : key[0]) + (key[1] == undef ? 0 : key[1]);
function width_row(row) = len(row) == 0 ? 0 : key_width(row[0]) + width_row(pop(row));
function width_board(rows) = len(rows) == 0 ? 0 : (
  let (current = width_row(rows[0]))
  let (next = width_board(pop(rows)))
    current > next ? current : next);

function key_height(key) = (key[2] == undef ? 0 : key[2]);
function height_row(row) = len(row) == 0 ? [0,0] : (
  let(other_rows = height_row(pop(row)))
  let(current = key_height(row[0]) + other_rows[0])
  let(maximum = current > other_rows[1] ? current : other_rows[1])
  [current, maximum]);
function height_board_rec(rows) = len(rows) == 0 ? 0 : (
  let (current = height_row(reverse(rows[0]))[1])
  let (next = height_board_rec(pop(rows)))
    current > next ? current : next);
function height_board(rows) = 
  let (height_rec = height_board_rec(rows))
    len(rows) + (height_rec > 0 ? height_rec : 0);

module case(rows, style="mx", margin=5, thickness=5, depth=0, radius=2, rest=0, circuits=[], _inherit_children="unset") {
  total_thickness = thickness + depth + height_for_style(style);
  z_offset = depth + height_for_style(style);
  if($children != 0 && (_inherit_children == "unset" || _inherit_children > 0)) {
    translate([0, 0, -z_offset])
      linear_extrude(total_thickness)
        offset(margin)
          children();
  } else {
    width=u_mm(width_board(rows))+margin*2;
    height=u_mm(height_board(rows))+margin*2+rest;
    translate([-margin, -margin, -z_offset]){
      translate([radius, 0, 0])
        cube([width-radius*2, height,total_thickness]);
      translate([0, radius, 0])
        cube([width, height-radius*2,total_thickness]);
      translate([radius, radius, 0])
        cylinder(total_thickness,radius,radius, $fn=60);
      translate([width-radius, radius, 0])
        cylinder(total_thickness,radius,radius, $fn=60);
      translate([width-radius, height-radius, 0])
        cylinder(total_thickness,radius,radius, $fn=60);
      translate([radius, height-radius, 0])
        cylinder(total_thickness,radius,radius, $fn=60);
    }
    if(len(circuits) > 0)
      translate([0, 0, -z_offset])
        linear_extrude(total_thickness)
          offset(margin)
            circuits_pcb_outline(circuits);
  }
}
// file: ../../../lib/variables.scad
key_size=19.05;
hole=14;

function u_mm(u) = u*key_size;
function hole_offset(u) = (key_size-hole)/2+u_mm(u-1)/2;

// This is used to determine how much space is between the top
// of the plate and the PCB.
function height_for_style(style) = style == "mx"        ? 5.334 :
                                   style == "redragon" ? 3.75  :
                                   style == "choc_v1"   ? 2.2   :  "invalid style";
// file: board_spec.scad
include <../../../keyboard.scad>

function circuit() = [[5,0,0,0,"pro_micro"],[6.3,0,0,0,"trrs_right"],];

function layout() = [
  [[],[],[],[],[]],
  [[1.25],[1.25],[1.25],[1.25]],
  [[1.75],[2.25],[]]
];

module the_case() {
    square([u_mm(7), u_mm(3)]);
}

board(layout(), depth=4, circuits=circuit(), inner_margin=2)
  the_case();
// main file
use <board_spec.scad>

bottom_case(layout(), circuits=circuit(), inner_margin=2, plate="board"){
  the_case();
}
